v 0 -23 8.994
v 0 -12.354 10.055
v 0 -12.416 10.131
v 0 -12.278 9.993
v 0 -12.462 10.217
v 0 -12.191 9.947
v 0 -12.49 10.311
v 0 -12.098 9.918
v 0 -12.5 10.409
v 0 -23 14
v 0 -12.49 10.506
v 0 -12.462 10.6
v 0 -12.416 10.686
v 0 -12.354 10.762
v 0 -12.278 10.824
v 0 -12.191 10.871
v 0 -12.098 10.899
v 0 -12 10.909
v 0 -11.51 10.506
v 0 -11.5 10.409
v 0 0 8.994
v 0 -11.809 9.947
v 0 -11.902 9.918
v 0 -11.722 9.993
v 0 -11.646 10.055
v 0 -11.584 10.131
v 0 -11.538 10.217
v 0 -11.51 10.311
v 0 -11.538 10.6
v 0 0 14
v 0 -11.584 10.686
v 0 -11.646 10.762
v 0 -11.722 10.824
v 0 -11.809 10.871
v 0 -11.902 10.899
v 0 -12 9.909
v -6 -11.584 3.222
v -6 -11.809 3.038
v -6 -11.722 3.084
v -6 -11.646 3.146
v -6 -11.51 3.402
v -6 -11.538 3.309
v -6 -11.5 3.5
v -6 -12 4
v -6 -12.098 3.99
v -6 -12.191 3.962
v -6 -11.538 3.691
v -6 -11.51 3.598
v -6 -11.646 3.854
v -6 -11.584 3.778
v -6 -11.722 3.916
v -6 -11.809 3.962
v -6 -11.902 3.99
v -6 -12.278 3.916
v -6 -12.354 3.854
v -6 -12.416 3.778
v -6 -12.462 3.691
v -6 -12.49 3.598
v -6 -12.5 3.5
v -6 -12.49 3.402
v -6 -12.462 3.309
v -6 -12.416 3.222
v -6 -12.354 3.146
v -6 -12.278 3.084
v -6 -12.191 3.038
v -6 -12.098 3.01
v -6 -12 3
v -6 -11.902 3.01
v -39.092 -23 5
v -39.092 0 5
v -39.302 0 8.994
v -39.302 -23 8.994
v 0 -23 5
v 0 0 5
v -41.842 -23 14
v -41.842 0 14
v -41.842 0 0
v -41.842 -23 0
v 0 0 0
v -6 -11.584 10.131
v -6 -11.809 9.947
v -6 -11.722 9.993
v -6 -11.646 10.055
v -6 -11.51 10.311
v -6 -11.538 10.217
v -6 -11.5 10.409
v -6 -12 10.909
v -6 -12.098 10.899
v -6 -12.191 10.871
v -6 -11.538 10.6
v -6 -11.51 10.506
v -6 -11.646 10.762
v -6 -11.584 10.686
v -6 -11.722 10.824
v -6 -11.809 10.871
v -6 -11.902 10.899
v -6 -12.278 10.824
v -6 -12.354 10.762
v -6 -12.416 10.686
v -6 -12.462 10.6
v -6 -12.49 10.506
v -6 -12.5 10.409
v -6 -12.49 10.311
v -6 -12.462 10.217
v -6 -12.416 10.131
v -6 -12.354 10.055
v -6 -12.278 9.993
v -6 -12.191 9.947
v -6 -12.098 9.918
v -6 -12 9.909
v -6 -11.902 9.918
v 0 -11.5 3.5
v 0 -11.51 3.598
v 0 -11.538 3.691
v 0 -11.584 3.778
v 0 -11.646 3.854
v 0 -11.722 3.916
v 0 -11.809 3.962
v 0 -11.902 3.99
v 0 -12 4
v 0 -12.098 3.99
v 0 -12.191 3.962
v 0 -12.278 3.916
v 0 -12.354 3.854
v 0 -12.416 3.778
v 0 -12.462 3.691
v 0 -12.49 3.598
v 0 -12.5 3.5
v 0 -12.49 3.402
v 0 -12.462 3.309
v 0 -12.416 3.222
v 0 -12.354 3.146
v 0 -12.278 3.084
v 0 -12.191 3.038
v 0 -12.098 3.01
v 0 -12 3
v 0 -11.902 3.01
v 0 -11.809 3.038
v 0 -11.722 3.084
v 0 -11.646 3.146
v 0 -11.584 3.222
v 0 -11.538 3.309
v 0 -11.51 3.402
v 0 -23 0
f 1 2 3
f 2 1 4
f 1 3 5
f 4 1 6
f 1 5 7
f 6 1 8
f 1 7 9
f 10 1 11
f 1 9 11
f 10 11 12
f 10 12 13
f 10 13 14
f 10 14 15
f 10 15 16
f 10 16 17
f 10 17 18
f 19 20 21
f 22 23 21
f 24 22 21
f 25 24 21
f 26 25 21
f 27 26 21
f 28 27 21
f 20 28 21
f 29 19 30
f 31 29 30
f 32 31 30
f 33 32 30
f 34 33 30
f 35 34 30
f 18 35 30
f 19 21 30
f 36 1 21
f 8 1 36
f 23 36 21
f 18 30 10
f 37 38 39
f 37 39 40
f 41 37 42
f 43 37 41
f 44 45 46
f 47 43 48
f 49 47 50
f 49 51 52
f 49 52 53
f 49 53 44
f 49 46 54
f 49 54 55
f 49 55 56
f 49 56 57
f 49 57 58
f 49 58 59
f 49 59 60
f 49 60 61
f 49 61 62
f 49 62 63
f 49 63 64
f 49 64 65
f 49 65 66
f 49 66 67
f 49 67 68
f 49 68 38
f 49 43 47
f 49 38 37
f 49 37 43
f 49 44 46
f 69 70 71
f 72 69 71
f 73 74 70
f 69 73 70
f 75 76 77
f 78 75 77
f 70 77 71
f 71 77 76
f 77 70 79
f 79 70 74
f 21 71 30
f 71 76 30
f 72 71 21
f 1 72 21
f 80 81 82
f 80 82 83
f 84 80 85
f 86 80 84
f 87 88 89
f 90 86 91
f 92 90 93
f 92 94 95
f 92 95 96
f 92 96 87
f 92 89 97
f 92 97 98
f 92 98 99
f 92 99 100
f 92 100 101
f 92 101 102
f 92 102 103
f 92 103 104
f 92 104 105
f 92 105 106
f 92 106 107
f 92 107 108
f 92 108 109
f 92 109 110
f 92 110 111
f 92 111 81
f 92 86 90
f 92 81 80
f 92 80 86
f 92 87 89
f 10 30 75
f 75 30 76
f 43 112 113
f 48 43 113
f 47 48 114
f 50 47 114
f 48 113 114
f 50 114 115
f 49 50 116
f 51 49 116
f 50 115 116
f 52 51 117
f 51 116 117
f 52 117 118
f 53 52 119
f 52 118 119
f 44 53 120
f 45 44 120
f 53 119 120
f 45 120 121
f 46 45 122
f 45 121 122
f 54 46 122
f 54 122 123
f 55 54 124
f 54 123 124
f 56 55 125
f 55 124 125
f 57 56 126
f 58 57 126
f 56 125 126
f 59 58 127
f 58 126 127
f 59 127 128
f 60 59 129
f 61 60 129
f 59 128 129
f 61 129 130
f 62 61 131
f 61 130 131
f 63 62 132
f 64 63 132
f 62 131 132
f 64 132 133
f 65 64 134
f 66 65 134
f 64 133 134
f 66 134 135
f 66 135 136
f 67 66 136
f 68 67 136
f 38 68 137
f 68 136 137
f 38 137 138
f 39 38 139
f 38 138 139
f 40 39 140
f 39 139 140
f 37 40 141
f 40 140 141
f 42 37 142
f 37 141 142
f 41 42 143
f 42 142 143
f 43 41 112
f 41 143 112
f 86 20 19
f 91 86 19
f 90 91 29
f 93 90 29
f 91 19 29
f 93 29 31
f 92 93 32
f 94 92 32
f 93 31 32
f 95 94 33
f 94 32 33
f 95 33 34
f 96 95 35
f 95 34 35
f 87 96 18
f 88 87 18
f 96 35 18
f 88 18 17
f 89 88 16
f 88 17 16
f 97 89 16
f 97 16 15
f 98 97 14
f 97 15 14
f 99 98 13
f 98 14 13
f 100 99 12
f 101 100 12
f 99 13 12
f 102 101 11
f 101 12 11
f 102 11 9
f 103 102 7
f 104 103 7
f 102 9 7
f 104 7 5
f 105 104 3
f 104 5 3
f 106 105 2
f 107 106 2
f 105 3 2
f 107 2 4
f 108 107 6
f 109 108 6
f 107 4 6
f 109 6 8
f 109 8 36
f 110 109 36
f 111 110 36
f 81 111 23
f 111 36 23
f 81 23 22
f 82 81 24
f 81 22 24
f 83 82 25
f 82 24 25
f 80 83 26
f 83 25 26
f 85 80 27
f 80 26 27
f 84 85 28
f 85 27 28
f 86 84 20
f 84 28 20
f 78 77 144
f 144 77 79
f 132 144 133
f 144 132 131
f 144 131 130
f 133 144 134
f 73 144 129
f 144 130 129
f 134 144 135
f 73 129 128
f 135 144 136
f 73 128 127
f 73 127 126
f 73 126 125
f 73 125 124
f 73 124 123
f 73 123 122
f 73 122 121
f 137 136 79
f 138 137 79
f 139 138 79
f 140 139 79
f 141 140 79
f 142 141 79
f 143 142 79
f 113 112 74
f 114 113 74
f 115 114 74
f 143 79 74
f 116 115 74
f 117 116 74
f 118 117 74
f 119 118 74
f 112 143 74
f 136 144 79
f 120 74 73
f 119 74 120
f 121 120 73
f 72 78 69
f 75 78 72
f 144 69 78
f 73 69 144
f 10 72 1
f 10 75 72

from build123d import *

# Parameters (mm, degrees)
F1_DEPTH = 23
F2_R     = 0.5
F3_DEPTH = 6


with BuildPart() as f1:
    # F0 (on Front) → F1 (new body)
    with BuildSketch(Plane.XZ):
        Polygon((0, 14), (-41.842094, 14), (-41.842094, 0), (0, 0), (0, 5), (-39.091877, 5), (-39.302094, 8.994472), (0, 8.994472), align=None)
    extrude(amount=F1_DEPTH)

    # F2 (on Right) → F3 (cut)
    with BuildSketch(Plane.YZ):
        with Locations((-12, 10.408686)):
            Circle(F2_R)
        with Locations((-12, 3.5)):
            Circle(F2_R)
    extrude(amount=-F3_DEPTH, mode=Mode.SUBTRACT)


solid = f1.part
